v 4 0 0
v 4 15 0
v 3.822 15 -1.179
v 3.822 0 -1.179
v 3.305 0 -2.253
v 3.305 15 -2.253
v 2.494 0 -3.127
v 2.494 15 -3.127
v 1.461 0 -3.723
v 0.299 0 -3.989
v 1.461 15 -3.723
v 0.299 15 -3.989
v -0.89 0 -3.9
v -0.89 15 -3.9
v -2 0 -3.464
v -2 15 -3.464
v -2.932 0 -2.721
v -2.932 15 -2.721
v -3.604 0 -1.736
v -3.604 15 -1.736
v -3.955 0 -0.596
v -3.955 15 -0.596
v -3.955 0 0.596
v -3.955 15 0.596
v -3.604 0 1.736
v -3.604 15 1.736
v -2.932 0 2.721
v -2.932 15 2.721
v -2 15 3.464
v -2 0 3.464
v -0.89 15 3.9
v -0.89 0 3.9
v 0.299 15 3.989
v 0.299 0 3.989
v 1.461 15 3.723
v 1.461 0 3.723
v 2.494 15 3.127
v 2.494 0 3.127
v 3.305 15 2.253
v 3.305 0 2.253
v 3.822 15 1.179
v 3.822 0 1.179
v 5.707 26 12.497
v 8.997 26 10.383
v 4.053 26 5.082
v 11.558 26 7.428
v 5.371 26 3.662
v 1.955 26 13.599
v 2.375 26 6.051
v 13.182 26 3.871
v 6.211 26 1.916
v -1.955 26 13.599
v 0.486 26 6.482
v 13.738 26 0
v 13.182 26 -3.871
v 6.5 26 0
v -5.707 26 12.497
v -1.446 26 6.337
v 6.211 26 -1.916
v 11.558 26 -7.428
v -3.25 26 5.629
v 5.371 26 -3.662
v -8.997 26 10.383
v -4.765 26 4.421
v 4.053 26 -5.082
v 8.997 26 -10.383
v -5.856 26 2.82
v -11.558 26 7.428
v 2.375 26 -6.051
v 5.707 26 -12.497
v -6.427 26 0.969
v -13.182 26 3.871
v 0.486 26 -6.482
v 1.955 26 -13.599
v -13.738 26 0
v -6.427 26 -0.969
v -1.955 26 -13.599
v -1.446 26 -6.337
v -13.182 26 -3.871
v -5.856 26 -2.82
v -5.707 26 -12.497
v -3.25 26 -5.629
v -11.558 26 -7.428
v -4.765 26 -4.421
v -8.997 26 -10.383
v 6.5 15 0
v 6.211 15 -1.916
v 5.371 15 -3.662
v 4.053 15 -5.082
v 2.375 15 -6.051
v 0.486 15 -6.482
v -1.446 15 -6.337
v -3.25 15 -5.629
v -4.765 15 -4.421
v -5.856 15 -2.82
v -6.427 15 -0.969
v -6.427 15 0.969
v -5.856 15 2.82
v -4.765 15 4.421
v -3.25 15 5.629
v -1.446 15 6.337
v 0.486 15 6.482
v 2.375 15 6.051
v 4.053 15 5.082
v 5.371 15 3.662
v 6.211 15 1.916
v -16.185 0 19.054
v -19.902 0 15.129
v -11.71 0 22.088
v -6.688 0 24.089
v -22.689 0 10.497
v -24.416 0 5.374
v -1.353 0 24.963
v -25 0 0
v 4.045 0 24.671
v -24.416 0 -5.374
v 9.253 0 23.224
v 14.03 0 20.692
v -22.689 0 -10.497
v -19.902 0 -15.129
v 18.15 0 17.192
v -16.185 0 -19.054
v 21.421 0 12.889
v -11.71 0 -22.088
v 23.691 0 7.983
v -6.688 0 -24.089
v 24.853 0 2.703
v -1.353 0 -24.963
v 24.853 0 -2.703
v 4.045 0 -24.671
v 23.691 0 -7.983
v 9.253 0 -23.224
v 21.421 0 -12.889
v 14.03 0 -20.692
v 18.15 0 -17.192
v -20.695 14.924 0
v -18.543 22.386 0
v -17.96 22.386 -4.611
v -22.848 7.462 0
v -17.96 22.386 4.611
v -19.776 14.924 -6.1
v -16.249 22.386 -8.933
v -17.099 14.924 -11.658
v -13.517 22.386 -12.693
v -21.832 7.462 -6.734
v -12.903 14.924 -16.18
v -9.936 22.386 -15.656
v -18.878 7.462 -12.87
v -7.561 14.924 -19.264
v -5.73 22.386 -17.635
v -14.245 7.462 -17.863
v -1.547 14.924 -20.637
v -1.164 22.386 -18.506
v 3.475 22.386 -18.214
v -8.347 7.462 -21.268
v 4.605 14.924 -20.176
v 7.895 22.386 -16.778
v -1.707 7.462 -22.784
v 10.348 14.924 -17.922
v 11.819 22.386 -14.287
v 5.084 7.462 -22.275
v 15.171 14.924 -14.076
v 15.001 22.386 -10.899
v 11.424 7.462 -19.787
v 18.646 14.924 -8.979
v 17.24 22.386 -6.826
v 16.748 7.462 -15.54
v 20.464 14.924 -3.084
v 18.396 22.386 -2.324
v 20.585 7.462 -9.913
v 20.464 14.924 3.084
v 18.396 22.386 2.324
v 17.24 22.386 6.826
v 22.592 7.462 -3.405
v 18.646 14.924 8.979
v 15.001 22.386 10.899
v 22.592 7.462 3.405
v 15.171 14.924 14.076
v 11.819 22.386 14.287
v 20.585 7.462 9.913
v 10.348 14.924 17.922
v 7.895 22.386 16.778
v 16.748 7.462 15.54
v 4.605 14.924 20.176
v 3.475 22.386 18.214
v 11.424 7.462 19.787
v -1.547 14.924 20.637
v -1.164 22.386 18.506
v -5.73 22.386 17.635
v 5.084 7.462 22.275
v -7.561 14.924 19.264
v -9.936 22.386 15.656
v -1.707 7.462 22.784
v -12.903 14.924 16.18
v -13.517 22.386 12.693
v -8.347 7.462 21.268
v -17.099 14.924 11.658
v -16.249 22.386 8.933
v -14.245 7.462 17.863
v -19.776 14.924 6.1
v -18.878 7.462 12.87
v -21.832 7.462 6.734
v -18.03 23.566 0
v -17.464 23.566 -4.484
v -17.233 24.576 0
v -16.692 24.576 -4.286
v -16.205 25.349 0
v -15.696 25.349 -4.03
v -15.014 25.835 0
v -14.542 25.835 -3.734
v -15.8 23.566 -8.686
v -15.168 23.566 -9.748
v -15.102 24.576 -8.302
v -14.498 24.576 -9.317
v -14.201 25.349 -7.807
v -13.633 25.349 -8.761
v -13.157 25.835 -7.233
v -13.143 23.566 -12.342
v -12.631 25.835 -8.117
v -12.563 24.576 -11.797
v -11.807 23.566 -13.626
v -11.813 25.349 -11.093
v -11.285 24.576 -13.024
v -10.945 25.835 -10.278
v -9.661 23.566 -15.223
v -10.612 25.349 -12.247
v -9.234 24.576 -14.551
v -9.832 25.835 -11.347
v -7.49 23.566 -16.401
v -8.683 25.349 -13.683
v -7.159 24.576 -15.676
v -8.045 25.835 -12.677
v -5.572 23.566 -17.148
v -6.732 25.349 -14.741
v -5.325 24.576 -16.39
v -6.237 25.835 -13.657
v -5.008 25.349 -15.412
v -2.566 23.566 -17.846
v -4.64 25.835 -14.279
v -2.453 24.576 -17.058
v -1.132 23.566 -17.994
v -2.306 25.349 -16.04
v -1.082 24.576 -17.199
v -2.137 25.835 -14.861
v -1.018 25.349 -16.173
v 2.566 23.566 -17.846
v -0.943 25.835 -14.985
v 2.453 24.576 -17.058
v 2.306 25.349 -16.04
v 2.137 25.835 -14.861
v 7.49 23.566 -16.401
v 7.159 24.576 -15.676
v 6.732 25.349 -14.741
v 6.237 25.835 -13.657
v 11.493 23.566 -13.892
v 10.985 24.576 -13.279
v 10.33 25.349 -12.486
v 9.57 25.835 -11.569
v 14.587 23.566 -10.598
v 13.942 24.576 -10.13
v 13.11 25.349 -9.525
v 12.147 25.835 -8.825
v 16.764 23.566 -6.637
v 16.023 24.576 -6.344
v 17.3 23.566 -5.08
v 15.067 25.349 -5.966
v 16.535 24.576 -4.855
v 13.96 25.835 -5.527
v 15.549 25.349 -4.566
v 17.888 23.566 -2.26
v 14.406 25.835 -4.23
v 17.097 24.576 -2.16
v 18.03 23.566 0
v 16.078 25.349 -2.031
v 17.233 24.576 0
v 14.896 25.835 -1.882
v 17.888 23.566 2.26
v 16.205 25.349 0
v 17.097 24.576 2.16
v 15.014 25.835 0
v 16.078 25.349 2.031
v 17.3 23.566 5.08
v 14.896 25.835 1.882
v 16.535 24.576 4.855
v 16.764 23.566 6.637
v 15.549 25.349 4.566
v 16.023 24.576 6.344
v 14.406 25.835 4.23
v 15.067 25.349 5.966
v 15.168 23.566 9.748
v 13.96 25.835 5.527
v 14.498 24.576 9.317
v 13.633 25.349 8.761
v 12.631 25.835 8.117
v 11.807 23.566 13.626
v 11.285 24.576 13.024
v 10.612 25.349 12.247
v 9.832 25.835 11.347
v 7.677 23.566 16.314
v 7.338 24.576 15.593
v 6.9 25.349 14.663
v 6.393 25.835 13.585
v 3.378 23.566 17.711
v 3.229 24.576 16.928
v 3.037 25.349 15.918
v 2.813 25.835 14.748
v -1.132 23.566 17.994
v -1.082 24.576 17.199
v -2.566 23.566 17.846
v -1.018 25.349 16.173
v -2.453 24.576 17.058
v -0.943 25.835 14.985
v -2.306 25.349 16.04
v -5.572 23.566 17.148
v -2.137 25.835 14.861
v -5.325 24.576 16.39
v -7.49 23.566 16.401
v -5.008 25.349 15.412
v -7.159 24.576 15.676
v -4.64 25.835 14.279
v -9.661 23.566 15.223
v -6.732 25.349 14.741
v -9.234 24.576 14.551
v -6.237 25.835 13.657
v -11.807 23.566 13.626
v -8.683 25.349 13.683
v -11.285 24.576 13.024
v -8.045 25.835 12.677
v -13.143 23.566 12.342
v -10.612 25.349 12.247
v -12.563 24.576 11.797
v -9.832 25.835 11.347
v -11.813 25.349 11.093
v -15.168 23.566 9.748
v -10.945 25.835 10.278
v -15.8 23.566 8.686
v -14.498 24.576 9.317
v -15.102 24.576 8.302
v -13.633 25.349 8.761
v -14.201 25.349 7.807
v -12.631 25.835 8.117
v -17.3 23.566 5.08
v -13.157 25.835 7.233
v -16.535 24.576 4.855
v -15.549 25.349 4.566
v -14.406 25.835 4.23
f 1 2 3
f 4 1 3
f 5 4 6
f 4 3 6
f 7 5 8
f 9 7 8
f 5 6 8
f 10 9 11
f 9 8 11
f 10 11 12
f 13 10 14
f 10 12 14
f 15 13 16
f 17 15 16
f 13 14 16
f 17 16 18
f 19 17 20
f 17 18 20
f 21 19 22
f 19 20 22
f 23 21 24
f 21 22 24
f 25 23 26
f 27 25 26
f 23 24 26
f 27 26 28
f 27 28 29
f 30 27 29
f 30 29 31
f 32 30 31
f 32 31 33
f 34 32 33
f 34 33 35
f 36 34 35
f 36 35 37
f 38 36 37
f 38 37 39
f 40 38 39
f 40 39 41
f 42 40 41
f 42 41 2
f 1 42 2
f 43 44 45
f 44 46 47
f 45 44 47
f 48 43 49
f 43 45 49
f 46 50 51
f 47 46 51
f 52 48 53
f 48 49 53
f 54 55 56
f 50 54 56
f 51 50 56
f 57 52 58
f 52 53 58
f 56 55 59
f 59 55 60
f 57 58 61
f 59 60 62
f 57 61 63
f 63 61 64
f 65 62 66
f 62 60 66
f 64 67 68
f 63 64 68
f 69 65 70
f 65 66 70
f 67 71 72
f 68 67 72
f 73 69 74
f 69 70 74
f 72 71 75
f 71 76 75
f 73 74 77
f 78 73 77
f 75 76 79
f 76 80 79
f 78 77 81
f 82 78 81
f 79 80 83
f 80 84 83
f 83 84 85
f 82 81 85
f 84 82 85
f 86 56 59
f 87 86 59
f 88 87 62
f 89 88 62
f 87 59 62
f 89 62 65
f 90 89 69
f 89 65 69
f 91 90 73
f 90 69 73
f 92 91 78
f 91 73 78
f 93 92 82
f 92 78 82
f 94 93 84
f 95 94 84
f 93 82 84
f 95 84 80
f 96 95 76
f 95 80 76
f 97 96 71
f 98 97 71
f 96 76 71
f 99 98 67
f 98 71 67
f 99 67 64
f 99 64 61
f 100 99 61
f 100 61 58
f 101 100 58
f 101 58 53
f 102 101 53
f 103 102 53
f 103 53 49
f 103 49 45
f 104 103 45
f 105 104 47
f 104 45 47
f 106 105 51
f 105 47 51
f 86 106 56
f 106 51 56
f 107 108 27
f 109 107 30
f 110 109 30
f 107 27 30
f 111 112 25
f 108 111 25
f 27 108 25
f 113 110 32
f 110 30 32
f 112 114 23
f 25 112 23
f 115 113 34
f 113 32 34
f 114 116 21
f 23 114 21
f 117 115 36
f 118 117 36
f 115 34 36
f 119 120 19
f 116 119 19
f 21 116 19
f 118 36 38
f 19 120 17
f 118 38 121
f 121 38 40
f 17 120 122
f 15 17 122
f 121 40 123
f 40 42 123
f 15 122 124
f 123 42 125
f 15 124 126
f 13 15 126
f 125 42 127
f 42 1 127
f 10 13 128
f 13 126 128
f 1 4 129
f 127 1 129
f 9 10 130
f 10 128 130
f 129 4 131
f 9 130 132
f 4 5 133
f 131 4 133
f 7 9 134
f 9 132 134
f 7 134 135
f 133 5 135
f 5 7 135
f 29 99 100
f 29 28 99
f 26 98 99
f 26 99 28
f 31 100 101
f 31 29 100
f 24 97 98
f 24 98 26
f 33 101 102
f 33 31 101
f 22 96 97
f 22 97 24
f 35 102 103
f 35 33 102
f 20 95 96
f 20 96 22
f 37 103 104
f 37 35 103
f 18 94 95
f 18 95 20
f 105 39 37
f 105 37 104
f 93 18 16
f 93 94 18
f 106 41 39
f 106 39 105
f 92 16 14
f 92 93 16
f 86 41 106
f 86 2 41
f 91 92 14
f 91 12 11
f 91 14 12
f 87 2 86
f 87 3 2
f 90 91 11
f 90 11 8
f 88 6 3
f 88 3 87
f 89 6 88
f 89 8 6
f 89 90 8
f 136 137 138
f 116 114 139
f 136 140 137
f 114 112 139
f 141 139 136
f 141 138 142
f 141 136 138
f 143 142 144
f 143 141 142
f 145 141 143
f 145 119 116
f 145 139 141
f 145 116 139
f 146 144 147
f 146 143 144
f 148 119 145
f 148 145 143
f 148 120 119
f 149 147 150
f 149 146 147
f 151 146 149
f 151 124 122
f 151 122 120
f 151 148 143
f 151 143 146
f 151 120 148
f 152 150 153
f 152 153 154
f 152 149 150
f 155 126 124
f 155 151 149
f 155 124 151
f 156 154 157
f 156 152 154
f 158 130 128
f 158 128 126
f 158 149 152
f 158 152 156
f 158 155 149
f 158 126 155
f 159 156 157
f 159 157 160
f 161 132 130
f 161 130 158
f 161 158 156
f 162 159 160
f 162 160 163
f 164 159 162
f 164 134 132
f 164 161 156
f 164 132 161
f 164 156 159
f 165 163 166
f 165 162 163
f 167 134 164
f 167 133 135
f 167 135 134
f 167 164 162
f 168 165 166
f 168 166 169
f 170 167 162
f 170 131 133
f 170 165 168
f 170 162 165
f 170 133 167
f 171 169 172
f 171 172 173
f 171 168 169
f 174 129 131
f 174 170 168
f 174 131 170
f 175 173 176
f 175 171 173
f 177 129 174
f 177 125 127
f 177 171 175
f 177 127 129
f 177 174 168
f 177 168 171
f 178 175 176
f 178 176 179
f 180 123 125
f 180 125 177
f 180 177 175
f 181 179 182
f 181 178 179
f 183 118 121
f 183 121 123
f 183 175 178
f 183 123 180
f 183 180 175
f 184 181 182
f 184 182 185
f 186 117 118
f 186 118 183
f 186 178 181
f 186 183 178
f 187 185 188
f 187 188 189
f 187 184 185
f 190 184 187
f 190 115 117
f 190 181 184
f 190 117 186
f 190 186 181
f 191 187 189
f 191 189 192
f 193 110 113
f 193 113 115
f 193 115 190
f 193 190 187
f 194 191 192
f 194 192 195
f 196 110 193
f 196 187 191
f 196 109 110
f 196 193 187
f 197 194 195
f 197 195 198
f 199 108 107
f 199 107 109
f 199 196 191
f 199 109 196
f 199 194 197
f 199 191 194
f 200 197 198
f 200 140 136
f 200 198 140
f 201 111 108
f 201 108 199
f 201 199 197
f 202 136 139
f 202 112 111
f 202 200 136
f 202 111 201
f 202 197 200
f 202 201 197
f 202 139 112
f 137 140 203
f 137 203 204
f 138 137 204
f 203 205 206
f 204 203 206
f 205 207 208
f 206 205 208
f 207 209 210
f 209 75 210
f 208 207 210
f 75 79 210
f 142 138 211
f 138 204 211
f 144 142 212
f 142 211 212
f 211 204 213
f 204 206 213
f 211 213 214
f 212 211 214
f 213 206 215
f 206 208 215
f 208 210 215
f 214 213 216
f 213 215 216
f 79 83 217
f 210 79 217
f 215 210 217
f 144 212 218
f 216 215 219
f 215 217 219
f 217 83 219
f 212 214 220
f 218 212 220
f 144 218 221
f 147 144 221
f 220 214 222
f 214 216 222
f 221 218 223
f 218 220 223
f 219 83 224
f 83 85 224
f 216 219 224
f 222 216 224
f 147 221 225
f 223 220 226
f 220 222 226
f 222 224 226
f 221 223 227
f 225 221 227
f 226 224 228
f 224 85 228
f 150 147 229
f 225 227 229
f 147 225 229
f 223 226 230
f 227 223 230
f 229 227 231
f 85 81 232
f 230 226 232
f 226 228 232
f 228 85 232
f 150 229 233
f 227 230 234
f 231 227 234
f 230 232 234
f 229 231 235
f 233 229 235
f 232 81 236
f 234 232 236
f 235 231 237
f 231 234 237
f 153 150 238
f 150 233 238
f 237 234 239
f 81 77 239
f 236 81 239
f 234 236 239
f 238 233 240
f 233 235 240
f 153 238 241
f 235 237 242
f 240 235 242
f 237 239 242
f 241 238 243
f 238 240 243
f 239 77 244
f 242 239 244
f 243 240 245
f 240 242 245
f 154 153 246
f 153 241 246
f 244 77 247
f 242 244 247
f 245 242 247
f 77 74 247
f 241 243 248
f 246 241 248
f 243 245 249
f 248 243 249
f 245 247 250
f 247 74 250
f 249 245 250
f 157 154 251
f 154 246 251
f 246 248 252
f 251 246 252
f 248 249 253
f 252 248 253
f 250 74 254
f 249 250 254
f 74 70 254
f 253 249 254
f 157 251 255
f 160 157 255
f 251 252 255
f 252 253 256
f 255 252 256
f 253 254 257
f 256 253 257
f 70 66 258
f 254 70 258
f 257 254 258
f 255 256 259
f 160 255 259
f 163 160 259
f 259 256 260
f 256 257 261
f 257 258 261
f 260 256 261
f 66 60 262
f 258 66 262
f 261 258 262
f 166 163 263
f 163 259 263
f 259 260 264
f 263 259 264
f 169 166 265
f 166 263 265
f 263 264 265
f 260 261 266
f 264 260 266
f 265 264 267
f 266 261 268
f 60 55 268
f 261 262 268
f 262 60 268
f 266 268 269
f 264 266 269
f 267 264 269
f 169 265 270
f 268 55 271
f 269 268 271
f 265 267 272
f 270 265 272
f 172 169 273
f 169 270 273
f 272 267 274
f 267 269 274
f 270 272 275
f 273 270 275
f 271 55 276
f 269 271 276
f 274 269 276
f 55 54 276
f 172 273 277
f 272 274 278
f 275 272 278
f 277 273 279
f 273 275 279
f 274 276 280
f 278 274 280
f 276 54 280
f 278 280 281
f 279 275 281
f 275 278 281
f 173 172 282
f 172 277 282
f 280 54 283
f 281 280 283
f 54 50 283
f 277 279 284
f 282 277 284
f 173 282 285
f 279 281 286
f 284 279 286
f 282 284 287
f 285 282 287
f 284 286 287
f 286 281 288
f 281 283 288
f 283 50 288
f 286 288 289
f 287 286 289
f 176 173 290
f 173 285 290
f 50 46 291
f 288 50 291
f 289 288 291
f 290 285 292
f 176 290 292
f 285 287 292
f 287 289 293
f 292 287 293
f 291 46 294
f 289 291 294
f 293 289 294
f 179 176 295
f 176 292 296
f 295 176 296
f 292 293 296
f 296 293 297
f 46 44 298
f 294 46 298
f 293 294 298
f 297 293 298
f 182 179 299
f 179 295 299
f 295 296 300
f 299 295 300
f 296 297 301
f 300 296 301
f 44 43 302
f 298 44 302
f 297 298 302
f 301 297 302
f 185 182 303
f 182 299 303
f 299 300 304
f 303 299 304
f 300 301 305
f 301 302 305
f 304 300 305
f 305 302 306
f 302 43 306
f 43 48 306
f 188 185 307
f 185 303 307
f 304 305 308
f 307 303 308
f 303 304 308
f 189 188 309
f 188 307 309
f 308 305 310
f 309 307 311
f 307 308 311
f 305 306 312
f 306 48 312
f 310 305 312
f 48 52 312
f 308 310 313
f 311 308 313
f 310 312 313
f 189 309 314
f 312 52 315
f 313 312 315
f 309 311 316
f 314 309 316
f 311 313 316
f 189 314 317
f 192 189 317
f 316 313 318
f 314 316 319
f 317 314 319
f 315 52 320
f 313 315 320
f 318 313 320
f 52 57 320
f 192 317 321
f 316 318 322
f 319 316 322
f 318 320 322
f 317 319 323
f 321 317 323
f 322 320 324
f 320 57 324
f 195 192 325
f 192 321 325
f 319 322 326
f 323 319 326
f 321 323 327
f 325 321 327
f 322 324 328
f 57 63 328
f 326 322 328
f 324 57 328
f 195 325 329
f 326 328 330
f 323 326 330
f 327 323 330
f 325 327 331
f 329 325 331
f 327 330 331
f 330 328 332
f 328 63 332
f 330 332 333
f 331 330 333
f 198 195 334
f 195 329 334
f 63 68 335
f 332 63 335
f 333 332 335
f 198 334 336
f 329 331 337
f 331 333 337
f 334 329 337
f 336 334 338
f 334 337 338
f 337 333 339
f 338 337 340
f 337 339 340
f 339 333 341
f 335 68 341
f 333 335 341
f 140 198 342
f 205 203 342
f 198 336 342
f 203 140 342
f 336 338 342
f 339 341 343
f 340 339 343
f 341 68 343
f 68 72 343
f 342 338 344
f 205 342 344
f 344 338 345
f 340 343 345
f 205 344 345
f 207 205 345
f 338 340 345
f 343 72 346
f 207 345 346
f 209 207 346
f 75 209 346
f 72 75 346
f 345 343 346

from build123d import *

# Parameters (mm, degrees)
SKETCH_1_R          = 17.5
SKETCH_2_R          = 25
SKETCH_3_R          = 6.5
CUT_EXTRUDE_1_DEPTH = 11
CUT_EXTRUDE_2_REACH = 17
SKETCH_4_R          = 4
FILLET_1_R          = 5


with BuildPart() as part:
    # 草图1 → 放样1 section 0
    with BuildSketch(Plane(origin=(0, 26, 0), x_dir=(-1, 0, 0), z_dir=(0, -1, 0))):
        Circle(SKETCH_1_R)
    # 草图2 → 放样1 section 1
    with BuildSketch(Plane(origin=(0, 0, 0), x_dir=(1, 0, 0), z_dir=(0, 1, 0))):
        Circle(SKETCH_2_R)
    loft()

    # 草图3 → 切除-拉伸1 (cut)
    with BuildSketch(Plane(origin=(0, 26, 0), x_dir=(1, 0, 0), z_dir=(0, 1, 0))):
        Circle(SKETCH_3_R)
    extrude(amount=-CUT_EXTRUDE_1_DEPTH, mode=Mode.SUBTRACT)

    # 草图4 → 切除-拉伸2 (cut, up to next)
    with BuildSketch(Plane(origin=(0, 15, 0), x_dir=(1, 0, 0), z_dir=(0, 1, 0)), mode=Mode.PRIVATE) as cut_extrude_2_sk1:
        Circle(SKETCH_4_R)
    cut_extrude_2_tool1 = extrude(cut_extrude_2_sk1.sketch, amount=-CUT_EXTRUDE_2_REACH, mode=Mode.PRIVATE) & part.part
    add(cut_extrude_2_tool1.solids().sort_by_distance((0, 15, 0))[0], mode=Mode.SUBTRACT)

    # 圆角1
    fillet_1_edges = [part.edges().sort_by_distance(p)[0] for p in [
        (17.5, 26, 0),
    ]]
    fillet(fillet_1_edges, radius=FILLET_1_R)


solid = part.part
